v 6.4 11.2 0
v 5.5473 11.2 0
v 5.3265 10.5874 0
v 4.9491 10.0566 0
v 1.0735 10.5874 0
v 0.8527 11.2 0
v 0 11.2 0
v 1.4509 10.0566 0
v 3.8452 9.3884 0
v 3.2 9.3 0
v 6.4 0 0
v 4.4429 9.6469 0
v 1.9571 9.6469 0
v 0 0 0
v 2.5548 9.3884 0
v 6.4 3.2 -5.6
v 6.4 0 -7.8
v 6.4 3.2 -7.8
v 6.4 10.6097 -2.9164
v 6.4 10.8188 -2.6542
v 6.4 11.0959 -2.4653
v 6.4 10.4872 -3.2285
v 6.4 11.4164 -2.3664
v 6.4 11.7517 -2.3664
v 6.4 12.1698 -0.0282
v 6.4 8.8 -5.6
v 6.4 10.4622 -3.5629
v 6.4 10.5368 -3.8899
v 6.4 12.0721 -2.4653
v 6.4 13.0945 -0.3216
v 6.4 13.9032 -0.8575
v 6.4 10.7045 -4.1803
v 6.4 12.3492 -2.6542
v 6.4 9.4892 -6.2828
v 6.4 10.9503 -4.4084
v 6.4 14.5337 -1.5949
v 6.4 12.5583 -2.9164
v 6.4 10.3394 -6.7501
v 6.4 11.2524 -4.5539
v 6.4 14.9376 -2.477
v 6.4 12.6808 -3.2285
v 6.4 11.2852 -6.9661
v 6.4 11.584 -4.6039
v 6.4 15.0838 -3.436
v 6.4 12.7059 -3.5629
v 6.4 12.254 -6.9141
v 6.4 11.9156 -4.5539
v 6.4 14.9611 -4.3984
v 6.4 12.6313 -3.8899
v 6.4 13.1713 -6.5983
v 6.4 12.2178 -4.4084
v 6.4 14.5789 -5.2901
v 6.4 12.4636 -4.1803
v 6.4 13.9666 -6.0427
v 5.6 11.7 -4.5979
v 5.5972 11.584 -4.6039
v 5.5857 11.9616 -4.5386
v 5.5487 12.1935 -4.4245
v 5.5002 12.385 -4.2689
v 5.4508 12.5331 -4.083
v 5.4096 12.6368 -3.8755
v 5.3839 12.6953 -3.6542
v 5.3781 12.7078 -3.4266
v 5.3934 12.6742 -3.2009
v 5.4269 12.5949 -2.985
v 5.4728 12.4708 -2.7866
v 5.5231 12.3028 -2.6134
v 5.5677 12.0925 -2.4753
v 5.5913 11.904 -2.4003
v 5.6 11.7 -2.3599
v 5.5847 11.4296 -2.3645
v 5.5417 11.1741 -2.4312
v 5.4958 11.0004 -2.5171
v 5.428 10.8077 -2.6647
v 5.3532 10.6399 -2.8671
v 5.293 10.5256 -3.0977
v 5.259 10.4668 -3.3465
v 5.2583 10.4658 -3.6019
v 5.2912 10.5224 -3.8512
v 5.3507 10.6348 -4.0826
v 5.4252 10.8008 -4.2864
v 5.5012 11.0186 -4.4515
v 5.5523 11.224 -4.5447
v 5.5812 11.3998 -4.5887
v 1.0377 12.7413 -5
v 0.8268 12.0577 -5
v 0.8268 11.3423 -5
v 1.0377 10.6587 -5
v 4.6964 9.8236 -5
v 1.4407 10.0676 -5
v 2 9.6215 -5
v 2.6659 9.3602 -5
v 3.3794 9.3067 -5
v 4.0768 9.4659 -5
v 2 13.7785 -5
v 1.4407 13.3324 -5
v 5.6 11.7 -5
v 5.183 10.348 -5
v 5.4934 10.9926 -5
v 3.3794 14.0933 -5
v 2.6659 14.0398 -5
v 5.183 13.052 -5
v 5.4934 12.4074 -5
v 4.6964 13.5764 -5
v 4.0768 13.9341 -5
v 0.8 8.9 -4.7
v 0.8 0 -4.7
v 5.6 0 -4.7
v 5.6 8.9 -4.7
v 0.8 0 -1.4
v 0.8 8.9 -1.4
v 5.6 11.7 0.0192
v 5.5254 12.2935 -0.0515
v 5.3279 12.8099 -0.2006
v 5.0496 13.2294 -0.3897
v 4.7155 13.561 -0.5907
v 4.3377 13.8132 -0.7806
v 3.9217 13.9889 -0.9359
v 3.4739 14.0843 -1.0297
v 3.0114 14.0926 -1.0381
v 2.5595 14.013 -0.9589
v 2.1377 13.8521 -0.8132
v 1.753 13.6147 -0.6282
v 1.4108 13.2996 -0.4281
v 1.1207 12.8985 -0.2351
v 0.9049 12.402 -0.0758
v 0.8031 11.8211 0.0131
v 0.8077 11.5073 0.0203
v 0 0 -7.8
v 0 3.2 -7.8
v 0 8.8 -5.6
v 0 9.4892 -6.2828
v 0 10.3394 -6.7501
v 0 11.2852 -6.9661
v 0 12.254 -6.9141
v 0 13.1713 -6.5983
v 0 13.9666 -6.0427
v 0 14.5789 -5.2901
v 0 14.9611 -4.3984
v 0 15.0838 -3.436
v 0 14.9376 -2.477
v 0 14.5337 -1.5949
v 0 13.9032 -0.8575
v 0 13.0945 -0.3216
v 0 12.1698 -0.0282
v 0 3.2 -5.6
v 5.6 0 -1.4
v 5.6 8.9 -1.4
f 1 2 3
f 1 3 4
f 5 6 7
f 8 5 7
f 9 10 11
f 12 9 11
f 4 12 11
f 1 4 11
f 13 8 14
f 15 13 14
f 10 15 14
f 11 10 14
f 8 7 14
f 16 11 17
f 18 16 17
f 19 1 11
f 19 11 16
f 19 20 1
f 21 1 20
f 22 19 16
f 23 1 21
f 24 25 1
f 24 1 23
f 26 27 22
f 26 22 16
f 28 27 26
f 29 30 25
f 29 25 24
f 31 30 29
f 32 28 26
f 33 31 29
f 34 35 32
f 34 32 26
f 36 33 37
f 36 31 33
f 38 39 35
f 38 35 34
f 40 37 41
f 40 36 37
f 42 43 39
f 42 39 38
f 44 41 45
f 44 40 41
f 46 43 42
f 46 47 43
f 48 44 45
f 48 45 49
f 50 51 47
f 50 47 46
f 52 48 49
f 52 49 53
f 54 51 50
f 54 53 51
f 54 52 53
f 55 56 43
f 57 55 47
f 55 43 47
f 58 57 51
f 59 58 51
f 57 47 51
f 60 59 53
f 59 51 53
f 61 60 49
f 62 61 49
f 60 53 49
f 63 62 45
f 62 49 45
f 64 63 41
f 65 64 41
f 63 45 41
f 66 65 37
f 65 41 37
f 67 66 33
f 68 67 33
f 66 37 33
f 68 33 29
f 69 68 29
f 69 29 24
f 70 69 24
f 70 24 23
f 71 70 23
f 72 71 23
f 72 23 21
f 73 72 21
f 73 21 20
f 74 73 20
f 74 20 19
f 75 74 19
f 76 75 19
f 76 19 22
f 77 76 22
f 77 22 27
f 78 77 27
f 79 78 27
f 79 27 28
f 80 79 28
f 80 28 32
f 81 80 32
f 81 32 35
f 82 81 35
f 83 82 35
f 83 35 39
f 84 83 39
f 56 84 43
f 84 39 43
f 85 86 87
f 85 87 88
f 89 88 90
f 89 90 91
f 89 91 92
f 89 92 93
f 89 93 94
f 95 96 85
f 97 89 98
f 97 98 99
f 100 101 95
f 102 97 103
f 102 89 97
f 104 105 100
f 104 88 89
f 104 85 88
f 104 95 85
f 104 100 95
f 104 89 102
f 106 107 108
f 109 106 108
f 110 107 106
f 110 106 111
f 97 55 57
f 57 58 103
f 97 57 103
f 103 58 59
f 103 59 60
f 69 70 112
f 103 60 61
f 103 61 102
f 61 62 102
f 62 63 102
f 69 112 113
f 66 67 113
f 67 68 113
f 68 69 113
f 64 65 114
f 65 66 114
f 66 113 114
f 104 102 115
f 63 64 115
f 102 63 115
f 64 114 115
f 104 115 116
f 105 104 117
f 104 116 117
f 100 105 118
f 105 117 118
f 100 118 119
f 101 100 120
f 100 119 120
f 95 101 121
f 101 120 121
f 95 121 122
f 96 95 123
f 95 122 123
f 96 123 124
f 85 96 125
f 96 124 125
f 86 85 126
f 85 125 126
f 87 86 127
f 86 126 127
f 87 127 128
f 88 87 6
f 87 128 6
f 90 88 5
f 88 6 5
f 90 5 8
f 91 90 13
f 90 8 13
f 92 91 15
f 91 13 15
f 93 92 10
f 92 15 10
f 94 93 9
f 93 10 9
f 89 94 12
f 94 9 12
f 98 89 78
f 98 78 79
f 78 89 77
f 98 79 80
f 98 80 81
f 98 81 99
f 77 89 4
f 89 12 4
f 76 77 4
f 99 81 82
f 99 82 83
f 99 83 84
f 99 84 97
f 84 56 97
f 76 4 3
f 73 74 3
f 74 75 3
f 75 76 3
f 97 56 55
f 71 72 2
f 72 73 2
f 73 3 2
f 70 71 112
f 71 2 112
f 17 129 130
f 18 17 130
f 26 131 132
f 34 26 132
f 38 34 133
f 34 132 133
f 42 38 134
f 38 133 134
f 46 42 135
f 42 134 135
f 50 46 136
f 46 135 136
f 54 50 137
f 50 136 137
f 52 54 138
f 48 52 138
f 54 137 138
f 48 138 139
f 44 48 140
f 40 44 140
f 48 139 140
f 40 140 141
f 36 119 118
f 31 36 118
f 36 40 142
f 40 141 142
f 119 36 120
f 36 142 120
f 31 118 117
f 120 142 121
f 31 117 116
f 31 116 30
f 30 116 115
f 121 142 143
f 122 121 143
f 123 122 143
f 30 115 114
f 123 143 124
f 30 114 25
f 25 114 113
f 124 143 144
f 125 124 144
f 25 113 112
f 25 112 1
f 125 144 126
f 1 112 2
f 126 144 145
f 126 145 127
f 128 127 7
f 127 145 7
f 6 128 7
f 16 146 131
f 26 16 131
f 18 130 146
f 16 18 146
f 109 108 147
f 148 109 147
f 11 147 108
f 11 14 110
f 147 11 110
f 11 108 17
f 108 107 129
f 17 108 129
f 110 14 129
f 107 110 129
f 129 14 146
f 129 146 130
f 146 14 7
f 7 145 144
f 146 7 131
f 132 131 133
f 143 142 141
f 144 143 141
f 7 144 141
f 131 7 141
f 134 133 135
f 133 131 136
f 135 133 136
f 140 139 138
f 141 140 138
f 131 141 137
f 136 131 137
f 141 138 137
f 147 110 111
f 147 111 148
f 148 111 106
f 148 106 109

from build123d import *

# Parameters (mm, degrees)
BOSS_EXTRUDE1_DEPTH = 6.4
SKETCH2_R           = 1.125
CUT_EXTRUDE1_DEPTH  = 2
SKETCH4_R           = 2.4
CUT_EXTRUDE3_DEPTH  = 5
SKETCH5_W           = 4.8
SKETCH5_H           = 3.3
CUT_EXTRUDE4_DEPTH  = 8.9


with BuildPart() as part:
    # Sketch1 → Boss-Extrude1 (new body)
    with BuildSketch(Plane(origin=(0, 0, 0), x_dir=(0, 0, -1), z_dir=(1, 0, 0))):
        with BuildLine():
            Line((0, 0), (7.8, 0))
            Line((7.8, 0), (7.8, 3.2))
            Line((7.8, 3.2), (5.6, 3.2))
            Line((5.6, 3.2), (5.6, 8.8))
            ThreePointArc((5.6, 8.8), (4.857585772, 14.801033467), (0, 11.2))
            Line((0, 11.2), (0, 0))
        make_face()
    extrude(amount=BOSS_EXTRUDE1_DEPTH)

    # Sketch2 → Cut-Extrude1 (cut)
    with BuildSketch(Plane(origin=(6.4, 0, 0), x_dir=(0, 0, -1), z_dir=(1, 0, 0))):
        with Locations((3.478868227, 11.584025862)):
            Circle(SKETCH2_R)
    extrude(amount=-CUT_EXTRUDE1_DEPTH, mode=Mode.SUBTRACT)

    # Sketch4 → Cut-Extrude3 (cut, symmetric)
    with BuildSketch(Plane.XY):
        with Locations((3.2, 11.7)):
            Circle(SKETCH4_R)
    extrude(amount=CUT_EXTRUDE3_DEPTH, both=True, mode=Mode.SUBTRACT)

    # Sketch5 → Cut-Extrude4 (cut)
    with BuildSketch(Plane.XZ):
        with Locations((3.2, -3.05)):
            Rectangle(SKETCH5_W, SKETCH5_H)
    extrude(amount=-CUT_EXTRUDE4_DEPTH, mode=Mode.SUBTRACT)


solid = part.part
